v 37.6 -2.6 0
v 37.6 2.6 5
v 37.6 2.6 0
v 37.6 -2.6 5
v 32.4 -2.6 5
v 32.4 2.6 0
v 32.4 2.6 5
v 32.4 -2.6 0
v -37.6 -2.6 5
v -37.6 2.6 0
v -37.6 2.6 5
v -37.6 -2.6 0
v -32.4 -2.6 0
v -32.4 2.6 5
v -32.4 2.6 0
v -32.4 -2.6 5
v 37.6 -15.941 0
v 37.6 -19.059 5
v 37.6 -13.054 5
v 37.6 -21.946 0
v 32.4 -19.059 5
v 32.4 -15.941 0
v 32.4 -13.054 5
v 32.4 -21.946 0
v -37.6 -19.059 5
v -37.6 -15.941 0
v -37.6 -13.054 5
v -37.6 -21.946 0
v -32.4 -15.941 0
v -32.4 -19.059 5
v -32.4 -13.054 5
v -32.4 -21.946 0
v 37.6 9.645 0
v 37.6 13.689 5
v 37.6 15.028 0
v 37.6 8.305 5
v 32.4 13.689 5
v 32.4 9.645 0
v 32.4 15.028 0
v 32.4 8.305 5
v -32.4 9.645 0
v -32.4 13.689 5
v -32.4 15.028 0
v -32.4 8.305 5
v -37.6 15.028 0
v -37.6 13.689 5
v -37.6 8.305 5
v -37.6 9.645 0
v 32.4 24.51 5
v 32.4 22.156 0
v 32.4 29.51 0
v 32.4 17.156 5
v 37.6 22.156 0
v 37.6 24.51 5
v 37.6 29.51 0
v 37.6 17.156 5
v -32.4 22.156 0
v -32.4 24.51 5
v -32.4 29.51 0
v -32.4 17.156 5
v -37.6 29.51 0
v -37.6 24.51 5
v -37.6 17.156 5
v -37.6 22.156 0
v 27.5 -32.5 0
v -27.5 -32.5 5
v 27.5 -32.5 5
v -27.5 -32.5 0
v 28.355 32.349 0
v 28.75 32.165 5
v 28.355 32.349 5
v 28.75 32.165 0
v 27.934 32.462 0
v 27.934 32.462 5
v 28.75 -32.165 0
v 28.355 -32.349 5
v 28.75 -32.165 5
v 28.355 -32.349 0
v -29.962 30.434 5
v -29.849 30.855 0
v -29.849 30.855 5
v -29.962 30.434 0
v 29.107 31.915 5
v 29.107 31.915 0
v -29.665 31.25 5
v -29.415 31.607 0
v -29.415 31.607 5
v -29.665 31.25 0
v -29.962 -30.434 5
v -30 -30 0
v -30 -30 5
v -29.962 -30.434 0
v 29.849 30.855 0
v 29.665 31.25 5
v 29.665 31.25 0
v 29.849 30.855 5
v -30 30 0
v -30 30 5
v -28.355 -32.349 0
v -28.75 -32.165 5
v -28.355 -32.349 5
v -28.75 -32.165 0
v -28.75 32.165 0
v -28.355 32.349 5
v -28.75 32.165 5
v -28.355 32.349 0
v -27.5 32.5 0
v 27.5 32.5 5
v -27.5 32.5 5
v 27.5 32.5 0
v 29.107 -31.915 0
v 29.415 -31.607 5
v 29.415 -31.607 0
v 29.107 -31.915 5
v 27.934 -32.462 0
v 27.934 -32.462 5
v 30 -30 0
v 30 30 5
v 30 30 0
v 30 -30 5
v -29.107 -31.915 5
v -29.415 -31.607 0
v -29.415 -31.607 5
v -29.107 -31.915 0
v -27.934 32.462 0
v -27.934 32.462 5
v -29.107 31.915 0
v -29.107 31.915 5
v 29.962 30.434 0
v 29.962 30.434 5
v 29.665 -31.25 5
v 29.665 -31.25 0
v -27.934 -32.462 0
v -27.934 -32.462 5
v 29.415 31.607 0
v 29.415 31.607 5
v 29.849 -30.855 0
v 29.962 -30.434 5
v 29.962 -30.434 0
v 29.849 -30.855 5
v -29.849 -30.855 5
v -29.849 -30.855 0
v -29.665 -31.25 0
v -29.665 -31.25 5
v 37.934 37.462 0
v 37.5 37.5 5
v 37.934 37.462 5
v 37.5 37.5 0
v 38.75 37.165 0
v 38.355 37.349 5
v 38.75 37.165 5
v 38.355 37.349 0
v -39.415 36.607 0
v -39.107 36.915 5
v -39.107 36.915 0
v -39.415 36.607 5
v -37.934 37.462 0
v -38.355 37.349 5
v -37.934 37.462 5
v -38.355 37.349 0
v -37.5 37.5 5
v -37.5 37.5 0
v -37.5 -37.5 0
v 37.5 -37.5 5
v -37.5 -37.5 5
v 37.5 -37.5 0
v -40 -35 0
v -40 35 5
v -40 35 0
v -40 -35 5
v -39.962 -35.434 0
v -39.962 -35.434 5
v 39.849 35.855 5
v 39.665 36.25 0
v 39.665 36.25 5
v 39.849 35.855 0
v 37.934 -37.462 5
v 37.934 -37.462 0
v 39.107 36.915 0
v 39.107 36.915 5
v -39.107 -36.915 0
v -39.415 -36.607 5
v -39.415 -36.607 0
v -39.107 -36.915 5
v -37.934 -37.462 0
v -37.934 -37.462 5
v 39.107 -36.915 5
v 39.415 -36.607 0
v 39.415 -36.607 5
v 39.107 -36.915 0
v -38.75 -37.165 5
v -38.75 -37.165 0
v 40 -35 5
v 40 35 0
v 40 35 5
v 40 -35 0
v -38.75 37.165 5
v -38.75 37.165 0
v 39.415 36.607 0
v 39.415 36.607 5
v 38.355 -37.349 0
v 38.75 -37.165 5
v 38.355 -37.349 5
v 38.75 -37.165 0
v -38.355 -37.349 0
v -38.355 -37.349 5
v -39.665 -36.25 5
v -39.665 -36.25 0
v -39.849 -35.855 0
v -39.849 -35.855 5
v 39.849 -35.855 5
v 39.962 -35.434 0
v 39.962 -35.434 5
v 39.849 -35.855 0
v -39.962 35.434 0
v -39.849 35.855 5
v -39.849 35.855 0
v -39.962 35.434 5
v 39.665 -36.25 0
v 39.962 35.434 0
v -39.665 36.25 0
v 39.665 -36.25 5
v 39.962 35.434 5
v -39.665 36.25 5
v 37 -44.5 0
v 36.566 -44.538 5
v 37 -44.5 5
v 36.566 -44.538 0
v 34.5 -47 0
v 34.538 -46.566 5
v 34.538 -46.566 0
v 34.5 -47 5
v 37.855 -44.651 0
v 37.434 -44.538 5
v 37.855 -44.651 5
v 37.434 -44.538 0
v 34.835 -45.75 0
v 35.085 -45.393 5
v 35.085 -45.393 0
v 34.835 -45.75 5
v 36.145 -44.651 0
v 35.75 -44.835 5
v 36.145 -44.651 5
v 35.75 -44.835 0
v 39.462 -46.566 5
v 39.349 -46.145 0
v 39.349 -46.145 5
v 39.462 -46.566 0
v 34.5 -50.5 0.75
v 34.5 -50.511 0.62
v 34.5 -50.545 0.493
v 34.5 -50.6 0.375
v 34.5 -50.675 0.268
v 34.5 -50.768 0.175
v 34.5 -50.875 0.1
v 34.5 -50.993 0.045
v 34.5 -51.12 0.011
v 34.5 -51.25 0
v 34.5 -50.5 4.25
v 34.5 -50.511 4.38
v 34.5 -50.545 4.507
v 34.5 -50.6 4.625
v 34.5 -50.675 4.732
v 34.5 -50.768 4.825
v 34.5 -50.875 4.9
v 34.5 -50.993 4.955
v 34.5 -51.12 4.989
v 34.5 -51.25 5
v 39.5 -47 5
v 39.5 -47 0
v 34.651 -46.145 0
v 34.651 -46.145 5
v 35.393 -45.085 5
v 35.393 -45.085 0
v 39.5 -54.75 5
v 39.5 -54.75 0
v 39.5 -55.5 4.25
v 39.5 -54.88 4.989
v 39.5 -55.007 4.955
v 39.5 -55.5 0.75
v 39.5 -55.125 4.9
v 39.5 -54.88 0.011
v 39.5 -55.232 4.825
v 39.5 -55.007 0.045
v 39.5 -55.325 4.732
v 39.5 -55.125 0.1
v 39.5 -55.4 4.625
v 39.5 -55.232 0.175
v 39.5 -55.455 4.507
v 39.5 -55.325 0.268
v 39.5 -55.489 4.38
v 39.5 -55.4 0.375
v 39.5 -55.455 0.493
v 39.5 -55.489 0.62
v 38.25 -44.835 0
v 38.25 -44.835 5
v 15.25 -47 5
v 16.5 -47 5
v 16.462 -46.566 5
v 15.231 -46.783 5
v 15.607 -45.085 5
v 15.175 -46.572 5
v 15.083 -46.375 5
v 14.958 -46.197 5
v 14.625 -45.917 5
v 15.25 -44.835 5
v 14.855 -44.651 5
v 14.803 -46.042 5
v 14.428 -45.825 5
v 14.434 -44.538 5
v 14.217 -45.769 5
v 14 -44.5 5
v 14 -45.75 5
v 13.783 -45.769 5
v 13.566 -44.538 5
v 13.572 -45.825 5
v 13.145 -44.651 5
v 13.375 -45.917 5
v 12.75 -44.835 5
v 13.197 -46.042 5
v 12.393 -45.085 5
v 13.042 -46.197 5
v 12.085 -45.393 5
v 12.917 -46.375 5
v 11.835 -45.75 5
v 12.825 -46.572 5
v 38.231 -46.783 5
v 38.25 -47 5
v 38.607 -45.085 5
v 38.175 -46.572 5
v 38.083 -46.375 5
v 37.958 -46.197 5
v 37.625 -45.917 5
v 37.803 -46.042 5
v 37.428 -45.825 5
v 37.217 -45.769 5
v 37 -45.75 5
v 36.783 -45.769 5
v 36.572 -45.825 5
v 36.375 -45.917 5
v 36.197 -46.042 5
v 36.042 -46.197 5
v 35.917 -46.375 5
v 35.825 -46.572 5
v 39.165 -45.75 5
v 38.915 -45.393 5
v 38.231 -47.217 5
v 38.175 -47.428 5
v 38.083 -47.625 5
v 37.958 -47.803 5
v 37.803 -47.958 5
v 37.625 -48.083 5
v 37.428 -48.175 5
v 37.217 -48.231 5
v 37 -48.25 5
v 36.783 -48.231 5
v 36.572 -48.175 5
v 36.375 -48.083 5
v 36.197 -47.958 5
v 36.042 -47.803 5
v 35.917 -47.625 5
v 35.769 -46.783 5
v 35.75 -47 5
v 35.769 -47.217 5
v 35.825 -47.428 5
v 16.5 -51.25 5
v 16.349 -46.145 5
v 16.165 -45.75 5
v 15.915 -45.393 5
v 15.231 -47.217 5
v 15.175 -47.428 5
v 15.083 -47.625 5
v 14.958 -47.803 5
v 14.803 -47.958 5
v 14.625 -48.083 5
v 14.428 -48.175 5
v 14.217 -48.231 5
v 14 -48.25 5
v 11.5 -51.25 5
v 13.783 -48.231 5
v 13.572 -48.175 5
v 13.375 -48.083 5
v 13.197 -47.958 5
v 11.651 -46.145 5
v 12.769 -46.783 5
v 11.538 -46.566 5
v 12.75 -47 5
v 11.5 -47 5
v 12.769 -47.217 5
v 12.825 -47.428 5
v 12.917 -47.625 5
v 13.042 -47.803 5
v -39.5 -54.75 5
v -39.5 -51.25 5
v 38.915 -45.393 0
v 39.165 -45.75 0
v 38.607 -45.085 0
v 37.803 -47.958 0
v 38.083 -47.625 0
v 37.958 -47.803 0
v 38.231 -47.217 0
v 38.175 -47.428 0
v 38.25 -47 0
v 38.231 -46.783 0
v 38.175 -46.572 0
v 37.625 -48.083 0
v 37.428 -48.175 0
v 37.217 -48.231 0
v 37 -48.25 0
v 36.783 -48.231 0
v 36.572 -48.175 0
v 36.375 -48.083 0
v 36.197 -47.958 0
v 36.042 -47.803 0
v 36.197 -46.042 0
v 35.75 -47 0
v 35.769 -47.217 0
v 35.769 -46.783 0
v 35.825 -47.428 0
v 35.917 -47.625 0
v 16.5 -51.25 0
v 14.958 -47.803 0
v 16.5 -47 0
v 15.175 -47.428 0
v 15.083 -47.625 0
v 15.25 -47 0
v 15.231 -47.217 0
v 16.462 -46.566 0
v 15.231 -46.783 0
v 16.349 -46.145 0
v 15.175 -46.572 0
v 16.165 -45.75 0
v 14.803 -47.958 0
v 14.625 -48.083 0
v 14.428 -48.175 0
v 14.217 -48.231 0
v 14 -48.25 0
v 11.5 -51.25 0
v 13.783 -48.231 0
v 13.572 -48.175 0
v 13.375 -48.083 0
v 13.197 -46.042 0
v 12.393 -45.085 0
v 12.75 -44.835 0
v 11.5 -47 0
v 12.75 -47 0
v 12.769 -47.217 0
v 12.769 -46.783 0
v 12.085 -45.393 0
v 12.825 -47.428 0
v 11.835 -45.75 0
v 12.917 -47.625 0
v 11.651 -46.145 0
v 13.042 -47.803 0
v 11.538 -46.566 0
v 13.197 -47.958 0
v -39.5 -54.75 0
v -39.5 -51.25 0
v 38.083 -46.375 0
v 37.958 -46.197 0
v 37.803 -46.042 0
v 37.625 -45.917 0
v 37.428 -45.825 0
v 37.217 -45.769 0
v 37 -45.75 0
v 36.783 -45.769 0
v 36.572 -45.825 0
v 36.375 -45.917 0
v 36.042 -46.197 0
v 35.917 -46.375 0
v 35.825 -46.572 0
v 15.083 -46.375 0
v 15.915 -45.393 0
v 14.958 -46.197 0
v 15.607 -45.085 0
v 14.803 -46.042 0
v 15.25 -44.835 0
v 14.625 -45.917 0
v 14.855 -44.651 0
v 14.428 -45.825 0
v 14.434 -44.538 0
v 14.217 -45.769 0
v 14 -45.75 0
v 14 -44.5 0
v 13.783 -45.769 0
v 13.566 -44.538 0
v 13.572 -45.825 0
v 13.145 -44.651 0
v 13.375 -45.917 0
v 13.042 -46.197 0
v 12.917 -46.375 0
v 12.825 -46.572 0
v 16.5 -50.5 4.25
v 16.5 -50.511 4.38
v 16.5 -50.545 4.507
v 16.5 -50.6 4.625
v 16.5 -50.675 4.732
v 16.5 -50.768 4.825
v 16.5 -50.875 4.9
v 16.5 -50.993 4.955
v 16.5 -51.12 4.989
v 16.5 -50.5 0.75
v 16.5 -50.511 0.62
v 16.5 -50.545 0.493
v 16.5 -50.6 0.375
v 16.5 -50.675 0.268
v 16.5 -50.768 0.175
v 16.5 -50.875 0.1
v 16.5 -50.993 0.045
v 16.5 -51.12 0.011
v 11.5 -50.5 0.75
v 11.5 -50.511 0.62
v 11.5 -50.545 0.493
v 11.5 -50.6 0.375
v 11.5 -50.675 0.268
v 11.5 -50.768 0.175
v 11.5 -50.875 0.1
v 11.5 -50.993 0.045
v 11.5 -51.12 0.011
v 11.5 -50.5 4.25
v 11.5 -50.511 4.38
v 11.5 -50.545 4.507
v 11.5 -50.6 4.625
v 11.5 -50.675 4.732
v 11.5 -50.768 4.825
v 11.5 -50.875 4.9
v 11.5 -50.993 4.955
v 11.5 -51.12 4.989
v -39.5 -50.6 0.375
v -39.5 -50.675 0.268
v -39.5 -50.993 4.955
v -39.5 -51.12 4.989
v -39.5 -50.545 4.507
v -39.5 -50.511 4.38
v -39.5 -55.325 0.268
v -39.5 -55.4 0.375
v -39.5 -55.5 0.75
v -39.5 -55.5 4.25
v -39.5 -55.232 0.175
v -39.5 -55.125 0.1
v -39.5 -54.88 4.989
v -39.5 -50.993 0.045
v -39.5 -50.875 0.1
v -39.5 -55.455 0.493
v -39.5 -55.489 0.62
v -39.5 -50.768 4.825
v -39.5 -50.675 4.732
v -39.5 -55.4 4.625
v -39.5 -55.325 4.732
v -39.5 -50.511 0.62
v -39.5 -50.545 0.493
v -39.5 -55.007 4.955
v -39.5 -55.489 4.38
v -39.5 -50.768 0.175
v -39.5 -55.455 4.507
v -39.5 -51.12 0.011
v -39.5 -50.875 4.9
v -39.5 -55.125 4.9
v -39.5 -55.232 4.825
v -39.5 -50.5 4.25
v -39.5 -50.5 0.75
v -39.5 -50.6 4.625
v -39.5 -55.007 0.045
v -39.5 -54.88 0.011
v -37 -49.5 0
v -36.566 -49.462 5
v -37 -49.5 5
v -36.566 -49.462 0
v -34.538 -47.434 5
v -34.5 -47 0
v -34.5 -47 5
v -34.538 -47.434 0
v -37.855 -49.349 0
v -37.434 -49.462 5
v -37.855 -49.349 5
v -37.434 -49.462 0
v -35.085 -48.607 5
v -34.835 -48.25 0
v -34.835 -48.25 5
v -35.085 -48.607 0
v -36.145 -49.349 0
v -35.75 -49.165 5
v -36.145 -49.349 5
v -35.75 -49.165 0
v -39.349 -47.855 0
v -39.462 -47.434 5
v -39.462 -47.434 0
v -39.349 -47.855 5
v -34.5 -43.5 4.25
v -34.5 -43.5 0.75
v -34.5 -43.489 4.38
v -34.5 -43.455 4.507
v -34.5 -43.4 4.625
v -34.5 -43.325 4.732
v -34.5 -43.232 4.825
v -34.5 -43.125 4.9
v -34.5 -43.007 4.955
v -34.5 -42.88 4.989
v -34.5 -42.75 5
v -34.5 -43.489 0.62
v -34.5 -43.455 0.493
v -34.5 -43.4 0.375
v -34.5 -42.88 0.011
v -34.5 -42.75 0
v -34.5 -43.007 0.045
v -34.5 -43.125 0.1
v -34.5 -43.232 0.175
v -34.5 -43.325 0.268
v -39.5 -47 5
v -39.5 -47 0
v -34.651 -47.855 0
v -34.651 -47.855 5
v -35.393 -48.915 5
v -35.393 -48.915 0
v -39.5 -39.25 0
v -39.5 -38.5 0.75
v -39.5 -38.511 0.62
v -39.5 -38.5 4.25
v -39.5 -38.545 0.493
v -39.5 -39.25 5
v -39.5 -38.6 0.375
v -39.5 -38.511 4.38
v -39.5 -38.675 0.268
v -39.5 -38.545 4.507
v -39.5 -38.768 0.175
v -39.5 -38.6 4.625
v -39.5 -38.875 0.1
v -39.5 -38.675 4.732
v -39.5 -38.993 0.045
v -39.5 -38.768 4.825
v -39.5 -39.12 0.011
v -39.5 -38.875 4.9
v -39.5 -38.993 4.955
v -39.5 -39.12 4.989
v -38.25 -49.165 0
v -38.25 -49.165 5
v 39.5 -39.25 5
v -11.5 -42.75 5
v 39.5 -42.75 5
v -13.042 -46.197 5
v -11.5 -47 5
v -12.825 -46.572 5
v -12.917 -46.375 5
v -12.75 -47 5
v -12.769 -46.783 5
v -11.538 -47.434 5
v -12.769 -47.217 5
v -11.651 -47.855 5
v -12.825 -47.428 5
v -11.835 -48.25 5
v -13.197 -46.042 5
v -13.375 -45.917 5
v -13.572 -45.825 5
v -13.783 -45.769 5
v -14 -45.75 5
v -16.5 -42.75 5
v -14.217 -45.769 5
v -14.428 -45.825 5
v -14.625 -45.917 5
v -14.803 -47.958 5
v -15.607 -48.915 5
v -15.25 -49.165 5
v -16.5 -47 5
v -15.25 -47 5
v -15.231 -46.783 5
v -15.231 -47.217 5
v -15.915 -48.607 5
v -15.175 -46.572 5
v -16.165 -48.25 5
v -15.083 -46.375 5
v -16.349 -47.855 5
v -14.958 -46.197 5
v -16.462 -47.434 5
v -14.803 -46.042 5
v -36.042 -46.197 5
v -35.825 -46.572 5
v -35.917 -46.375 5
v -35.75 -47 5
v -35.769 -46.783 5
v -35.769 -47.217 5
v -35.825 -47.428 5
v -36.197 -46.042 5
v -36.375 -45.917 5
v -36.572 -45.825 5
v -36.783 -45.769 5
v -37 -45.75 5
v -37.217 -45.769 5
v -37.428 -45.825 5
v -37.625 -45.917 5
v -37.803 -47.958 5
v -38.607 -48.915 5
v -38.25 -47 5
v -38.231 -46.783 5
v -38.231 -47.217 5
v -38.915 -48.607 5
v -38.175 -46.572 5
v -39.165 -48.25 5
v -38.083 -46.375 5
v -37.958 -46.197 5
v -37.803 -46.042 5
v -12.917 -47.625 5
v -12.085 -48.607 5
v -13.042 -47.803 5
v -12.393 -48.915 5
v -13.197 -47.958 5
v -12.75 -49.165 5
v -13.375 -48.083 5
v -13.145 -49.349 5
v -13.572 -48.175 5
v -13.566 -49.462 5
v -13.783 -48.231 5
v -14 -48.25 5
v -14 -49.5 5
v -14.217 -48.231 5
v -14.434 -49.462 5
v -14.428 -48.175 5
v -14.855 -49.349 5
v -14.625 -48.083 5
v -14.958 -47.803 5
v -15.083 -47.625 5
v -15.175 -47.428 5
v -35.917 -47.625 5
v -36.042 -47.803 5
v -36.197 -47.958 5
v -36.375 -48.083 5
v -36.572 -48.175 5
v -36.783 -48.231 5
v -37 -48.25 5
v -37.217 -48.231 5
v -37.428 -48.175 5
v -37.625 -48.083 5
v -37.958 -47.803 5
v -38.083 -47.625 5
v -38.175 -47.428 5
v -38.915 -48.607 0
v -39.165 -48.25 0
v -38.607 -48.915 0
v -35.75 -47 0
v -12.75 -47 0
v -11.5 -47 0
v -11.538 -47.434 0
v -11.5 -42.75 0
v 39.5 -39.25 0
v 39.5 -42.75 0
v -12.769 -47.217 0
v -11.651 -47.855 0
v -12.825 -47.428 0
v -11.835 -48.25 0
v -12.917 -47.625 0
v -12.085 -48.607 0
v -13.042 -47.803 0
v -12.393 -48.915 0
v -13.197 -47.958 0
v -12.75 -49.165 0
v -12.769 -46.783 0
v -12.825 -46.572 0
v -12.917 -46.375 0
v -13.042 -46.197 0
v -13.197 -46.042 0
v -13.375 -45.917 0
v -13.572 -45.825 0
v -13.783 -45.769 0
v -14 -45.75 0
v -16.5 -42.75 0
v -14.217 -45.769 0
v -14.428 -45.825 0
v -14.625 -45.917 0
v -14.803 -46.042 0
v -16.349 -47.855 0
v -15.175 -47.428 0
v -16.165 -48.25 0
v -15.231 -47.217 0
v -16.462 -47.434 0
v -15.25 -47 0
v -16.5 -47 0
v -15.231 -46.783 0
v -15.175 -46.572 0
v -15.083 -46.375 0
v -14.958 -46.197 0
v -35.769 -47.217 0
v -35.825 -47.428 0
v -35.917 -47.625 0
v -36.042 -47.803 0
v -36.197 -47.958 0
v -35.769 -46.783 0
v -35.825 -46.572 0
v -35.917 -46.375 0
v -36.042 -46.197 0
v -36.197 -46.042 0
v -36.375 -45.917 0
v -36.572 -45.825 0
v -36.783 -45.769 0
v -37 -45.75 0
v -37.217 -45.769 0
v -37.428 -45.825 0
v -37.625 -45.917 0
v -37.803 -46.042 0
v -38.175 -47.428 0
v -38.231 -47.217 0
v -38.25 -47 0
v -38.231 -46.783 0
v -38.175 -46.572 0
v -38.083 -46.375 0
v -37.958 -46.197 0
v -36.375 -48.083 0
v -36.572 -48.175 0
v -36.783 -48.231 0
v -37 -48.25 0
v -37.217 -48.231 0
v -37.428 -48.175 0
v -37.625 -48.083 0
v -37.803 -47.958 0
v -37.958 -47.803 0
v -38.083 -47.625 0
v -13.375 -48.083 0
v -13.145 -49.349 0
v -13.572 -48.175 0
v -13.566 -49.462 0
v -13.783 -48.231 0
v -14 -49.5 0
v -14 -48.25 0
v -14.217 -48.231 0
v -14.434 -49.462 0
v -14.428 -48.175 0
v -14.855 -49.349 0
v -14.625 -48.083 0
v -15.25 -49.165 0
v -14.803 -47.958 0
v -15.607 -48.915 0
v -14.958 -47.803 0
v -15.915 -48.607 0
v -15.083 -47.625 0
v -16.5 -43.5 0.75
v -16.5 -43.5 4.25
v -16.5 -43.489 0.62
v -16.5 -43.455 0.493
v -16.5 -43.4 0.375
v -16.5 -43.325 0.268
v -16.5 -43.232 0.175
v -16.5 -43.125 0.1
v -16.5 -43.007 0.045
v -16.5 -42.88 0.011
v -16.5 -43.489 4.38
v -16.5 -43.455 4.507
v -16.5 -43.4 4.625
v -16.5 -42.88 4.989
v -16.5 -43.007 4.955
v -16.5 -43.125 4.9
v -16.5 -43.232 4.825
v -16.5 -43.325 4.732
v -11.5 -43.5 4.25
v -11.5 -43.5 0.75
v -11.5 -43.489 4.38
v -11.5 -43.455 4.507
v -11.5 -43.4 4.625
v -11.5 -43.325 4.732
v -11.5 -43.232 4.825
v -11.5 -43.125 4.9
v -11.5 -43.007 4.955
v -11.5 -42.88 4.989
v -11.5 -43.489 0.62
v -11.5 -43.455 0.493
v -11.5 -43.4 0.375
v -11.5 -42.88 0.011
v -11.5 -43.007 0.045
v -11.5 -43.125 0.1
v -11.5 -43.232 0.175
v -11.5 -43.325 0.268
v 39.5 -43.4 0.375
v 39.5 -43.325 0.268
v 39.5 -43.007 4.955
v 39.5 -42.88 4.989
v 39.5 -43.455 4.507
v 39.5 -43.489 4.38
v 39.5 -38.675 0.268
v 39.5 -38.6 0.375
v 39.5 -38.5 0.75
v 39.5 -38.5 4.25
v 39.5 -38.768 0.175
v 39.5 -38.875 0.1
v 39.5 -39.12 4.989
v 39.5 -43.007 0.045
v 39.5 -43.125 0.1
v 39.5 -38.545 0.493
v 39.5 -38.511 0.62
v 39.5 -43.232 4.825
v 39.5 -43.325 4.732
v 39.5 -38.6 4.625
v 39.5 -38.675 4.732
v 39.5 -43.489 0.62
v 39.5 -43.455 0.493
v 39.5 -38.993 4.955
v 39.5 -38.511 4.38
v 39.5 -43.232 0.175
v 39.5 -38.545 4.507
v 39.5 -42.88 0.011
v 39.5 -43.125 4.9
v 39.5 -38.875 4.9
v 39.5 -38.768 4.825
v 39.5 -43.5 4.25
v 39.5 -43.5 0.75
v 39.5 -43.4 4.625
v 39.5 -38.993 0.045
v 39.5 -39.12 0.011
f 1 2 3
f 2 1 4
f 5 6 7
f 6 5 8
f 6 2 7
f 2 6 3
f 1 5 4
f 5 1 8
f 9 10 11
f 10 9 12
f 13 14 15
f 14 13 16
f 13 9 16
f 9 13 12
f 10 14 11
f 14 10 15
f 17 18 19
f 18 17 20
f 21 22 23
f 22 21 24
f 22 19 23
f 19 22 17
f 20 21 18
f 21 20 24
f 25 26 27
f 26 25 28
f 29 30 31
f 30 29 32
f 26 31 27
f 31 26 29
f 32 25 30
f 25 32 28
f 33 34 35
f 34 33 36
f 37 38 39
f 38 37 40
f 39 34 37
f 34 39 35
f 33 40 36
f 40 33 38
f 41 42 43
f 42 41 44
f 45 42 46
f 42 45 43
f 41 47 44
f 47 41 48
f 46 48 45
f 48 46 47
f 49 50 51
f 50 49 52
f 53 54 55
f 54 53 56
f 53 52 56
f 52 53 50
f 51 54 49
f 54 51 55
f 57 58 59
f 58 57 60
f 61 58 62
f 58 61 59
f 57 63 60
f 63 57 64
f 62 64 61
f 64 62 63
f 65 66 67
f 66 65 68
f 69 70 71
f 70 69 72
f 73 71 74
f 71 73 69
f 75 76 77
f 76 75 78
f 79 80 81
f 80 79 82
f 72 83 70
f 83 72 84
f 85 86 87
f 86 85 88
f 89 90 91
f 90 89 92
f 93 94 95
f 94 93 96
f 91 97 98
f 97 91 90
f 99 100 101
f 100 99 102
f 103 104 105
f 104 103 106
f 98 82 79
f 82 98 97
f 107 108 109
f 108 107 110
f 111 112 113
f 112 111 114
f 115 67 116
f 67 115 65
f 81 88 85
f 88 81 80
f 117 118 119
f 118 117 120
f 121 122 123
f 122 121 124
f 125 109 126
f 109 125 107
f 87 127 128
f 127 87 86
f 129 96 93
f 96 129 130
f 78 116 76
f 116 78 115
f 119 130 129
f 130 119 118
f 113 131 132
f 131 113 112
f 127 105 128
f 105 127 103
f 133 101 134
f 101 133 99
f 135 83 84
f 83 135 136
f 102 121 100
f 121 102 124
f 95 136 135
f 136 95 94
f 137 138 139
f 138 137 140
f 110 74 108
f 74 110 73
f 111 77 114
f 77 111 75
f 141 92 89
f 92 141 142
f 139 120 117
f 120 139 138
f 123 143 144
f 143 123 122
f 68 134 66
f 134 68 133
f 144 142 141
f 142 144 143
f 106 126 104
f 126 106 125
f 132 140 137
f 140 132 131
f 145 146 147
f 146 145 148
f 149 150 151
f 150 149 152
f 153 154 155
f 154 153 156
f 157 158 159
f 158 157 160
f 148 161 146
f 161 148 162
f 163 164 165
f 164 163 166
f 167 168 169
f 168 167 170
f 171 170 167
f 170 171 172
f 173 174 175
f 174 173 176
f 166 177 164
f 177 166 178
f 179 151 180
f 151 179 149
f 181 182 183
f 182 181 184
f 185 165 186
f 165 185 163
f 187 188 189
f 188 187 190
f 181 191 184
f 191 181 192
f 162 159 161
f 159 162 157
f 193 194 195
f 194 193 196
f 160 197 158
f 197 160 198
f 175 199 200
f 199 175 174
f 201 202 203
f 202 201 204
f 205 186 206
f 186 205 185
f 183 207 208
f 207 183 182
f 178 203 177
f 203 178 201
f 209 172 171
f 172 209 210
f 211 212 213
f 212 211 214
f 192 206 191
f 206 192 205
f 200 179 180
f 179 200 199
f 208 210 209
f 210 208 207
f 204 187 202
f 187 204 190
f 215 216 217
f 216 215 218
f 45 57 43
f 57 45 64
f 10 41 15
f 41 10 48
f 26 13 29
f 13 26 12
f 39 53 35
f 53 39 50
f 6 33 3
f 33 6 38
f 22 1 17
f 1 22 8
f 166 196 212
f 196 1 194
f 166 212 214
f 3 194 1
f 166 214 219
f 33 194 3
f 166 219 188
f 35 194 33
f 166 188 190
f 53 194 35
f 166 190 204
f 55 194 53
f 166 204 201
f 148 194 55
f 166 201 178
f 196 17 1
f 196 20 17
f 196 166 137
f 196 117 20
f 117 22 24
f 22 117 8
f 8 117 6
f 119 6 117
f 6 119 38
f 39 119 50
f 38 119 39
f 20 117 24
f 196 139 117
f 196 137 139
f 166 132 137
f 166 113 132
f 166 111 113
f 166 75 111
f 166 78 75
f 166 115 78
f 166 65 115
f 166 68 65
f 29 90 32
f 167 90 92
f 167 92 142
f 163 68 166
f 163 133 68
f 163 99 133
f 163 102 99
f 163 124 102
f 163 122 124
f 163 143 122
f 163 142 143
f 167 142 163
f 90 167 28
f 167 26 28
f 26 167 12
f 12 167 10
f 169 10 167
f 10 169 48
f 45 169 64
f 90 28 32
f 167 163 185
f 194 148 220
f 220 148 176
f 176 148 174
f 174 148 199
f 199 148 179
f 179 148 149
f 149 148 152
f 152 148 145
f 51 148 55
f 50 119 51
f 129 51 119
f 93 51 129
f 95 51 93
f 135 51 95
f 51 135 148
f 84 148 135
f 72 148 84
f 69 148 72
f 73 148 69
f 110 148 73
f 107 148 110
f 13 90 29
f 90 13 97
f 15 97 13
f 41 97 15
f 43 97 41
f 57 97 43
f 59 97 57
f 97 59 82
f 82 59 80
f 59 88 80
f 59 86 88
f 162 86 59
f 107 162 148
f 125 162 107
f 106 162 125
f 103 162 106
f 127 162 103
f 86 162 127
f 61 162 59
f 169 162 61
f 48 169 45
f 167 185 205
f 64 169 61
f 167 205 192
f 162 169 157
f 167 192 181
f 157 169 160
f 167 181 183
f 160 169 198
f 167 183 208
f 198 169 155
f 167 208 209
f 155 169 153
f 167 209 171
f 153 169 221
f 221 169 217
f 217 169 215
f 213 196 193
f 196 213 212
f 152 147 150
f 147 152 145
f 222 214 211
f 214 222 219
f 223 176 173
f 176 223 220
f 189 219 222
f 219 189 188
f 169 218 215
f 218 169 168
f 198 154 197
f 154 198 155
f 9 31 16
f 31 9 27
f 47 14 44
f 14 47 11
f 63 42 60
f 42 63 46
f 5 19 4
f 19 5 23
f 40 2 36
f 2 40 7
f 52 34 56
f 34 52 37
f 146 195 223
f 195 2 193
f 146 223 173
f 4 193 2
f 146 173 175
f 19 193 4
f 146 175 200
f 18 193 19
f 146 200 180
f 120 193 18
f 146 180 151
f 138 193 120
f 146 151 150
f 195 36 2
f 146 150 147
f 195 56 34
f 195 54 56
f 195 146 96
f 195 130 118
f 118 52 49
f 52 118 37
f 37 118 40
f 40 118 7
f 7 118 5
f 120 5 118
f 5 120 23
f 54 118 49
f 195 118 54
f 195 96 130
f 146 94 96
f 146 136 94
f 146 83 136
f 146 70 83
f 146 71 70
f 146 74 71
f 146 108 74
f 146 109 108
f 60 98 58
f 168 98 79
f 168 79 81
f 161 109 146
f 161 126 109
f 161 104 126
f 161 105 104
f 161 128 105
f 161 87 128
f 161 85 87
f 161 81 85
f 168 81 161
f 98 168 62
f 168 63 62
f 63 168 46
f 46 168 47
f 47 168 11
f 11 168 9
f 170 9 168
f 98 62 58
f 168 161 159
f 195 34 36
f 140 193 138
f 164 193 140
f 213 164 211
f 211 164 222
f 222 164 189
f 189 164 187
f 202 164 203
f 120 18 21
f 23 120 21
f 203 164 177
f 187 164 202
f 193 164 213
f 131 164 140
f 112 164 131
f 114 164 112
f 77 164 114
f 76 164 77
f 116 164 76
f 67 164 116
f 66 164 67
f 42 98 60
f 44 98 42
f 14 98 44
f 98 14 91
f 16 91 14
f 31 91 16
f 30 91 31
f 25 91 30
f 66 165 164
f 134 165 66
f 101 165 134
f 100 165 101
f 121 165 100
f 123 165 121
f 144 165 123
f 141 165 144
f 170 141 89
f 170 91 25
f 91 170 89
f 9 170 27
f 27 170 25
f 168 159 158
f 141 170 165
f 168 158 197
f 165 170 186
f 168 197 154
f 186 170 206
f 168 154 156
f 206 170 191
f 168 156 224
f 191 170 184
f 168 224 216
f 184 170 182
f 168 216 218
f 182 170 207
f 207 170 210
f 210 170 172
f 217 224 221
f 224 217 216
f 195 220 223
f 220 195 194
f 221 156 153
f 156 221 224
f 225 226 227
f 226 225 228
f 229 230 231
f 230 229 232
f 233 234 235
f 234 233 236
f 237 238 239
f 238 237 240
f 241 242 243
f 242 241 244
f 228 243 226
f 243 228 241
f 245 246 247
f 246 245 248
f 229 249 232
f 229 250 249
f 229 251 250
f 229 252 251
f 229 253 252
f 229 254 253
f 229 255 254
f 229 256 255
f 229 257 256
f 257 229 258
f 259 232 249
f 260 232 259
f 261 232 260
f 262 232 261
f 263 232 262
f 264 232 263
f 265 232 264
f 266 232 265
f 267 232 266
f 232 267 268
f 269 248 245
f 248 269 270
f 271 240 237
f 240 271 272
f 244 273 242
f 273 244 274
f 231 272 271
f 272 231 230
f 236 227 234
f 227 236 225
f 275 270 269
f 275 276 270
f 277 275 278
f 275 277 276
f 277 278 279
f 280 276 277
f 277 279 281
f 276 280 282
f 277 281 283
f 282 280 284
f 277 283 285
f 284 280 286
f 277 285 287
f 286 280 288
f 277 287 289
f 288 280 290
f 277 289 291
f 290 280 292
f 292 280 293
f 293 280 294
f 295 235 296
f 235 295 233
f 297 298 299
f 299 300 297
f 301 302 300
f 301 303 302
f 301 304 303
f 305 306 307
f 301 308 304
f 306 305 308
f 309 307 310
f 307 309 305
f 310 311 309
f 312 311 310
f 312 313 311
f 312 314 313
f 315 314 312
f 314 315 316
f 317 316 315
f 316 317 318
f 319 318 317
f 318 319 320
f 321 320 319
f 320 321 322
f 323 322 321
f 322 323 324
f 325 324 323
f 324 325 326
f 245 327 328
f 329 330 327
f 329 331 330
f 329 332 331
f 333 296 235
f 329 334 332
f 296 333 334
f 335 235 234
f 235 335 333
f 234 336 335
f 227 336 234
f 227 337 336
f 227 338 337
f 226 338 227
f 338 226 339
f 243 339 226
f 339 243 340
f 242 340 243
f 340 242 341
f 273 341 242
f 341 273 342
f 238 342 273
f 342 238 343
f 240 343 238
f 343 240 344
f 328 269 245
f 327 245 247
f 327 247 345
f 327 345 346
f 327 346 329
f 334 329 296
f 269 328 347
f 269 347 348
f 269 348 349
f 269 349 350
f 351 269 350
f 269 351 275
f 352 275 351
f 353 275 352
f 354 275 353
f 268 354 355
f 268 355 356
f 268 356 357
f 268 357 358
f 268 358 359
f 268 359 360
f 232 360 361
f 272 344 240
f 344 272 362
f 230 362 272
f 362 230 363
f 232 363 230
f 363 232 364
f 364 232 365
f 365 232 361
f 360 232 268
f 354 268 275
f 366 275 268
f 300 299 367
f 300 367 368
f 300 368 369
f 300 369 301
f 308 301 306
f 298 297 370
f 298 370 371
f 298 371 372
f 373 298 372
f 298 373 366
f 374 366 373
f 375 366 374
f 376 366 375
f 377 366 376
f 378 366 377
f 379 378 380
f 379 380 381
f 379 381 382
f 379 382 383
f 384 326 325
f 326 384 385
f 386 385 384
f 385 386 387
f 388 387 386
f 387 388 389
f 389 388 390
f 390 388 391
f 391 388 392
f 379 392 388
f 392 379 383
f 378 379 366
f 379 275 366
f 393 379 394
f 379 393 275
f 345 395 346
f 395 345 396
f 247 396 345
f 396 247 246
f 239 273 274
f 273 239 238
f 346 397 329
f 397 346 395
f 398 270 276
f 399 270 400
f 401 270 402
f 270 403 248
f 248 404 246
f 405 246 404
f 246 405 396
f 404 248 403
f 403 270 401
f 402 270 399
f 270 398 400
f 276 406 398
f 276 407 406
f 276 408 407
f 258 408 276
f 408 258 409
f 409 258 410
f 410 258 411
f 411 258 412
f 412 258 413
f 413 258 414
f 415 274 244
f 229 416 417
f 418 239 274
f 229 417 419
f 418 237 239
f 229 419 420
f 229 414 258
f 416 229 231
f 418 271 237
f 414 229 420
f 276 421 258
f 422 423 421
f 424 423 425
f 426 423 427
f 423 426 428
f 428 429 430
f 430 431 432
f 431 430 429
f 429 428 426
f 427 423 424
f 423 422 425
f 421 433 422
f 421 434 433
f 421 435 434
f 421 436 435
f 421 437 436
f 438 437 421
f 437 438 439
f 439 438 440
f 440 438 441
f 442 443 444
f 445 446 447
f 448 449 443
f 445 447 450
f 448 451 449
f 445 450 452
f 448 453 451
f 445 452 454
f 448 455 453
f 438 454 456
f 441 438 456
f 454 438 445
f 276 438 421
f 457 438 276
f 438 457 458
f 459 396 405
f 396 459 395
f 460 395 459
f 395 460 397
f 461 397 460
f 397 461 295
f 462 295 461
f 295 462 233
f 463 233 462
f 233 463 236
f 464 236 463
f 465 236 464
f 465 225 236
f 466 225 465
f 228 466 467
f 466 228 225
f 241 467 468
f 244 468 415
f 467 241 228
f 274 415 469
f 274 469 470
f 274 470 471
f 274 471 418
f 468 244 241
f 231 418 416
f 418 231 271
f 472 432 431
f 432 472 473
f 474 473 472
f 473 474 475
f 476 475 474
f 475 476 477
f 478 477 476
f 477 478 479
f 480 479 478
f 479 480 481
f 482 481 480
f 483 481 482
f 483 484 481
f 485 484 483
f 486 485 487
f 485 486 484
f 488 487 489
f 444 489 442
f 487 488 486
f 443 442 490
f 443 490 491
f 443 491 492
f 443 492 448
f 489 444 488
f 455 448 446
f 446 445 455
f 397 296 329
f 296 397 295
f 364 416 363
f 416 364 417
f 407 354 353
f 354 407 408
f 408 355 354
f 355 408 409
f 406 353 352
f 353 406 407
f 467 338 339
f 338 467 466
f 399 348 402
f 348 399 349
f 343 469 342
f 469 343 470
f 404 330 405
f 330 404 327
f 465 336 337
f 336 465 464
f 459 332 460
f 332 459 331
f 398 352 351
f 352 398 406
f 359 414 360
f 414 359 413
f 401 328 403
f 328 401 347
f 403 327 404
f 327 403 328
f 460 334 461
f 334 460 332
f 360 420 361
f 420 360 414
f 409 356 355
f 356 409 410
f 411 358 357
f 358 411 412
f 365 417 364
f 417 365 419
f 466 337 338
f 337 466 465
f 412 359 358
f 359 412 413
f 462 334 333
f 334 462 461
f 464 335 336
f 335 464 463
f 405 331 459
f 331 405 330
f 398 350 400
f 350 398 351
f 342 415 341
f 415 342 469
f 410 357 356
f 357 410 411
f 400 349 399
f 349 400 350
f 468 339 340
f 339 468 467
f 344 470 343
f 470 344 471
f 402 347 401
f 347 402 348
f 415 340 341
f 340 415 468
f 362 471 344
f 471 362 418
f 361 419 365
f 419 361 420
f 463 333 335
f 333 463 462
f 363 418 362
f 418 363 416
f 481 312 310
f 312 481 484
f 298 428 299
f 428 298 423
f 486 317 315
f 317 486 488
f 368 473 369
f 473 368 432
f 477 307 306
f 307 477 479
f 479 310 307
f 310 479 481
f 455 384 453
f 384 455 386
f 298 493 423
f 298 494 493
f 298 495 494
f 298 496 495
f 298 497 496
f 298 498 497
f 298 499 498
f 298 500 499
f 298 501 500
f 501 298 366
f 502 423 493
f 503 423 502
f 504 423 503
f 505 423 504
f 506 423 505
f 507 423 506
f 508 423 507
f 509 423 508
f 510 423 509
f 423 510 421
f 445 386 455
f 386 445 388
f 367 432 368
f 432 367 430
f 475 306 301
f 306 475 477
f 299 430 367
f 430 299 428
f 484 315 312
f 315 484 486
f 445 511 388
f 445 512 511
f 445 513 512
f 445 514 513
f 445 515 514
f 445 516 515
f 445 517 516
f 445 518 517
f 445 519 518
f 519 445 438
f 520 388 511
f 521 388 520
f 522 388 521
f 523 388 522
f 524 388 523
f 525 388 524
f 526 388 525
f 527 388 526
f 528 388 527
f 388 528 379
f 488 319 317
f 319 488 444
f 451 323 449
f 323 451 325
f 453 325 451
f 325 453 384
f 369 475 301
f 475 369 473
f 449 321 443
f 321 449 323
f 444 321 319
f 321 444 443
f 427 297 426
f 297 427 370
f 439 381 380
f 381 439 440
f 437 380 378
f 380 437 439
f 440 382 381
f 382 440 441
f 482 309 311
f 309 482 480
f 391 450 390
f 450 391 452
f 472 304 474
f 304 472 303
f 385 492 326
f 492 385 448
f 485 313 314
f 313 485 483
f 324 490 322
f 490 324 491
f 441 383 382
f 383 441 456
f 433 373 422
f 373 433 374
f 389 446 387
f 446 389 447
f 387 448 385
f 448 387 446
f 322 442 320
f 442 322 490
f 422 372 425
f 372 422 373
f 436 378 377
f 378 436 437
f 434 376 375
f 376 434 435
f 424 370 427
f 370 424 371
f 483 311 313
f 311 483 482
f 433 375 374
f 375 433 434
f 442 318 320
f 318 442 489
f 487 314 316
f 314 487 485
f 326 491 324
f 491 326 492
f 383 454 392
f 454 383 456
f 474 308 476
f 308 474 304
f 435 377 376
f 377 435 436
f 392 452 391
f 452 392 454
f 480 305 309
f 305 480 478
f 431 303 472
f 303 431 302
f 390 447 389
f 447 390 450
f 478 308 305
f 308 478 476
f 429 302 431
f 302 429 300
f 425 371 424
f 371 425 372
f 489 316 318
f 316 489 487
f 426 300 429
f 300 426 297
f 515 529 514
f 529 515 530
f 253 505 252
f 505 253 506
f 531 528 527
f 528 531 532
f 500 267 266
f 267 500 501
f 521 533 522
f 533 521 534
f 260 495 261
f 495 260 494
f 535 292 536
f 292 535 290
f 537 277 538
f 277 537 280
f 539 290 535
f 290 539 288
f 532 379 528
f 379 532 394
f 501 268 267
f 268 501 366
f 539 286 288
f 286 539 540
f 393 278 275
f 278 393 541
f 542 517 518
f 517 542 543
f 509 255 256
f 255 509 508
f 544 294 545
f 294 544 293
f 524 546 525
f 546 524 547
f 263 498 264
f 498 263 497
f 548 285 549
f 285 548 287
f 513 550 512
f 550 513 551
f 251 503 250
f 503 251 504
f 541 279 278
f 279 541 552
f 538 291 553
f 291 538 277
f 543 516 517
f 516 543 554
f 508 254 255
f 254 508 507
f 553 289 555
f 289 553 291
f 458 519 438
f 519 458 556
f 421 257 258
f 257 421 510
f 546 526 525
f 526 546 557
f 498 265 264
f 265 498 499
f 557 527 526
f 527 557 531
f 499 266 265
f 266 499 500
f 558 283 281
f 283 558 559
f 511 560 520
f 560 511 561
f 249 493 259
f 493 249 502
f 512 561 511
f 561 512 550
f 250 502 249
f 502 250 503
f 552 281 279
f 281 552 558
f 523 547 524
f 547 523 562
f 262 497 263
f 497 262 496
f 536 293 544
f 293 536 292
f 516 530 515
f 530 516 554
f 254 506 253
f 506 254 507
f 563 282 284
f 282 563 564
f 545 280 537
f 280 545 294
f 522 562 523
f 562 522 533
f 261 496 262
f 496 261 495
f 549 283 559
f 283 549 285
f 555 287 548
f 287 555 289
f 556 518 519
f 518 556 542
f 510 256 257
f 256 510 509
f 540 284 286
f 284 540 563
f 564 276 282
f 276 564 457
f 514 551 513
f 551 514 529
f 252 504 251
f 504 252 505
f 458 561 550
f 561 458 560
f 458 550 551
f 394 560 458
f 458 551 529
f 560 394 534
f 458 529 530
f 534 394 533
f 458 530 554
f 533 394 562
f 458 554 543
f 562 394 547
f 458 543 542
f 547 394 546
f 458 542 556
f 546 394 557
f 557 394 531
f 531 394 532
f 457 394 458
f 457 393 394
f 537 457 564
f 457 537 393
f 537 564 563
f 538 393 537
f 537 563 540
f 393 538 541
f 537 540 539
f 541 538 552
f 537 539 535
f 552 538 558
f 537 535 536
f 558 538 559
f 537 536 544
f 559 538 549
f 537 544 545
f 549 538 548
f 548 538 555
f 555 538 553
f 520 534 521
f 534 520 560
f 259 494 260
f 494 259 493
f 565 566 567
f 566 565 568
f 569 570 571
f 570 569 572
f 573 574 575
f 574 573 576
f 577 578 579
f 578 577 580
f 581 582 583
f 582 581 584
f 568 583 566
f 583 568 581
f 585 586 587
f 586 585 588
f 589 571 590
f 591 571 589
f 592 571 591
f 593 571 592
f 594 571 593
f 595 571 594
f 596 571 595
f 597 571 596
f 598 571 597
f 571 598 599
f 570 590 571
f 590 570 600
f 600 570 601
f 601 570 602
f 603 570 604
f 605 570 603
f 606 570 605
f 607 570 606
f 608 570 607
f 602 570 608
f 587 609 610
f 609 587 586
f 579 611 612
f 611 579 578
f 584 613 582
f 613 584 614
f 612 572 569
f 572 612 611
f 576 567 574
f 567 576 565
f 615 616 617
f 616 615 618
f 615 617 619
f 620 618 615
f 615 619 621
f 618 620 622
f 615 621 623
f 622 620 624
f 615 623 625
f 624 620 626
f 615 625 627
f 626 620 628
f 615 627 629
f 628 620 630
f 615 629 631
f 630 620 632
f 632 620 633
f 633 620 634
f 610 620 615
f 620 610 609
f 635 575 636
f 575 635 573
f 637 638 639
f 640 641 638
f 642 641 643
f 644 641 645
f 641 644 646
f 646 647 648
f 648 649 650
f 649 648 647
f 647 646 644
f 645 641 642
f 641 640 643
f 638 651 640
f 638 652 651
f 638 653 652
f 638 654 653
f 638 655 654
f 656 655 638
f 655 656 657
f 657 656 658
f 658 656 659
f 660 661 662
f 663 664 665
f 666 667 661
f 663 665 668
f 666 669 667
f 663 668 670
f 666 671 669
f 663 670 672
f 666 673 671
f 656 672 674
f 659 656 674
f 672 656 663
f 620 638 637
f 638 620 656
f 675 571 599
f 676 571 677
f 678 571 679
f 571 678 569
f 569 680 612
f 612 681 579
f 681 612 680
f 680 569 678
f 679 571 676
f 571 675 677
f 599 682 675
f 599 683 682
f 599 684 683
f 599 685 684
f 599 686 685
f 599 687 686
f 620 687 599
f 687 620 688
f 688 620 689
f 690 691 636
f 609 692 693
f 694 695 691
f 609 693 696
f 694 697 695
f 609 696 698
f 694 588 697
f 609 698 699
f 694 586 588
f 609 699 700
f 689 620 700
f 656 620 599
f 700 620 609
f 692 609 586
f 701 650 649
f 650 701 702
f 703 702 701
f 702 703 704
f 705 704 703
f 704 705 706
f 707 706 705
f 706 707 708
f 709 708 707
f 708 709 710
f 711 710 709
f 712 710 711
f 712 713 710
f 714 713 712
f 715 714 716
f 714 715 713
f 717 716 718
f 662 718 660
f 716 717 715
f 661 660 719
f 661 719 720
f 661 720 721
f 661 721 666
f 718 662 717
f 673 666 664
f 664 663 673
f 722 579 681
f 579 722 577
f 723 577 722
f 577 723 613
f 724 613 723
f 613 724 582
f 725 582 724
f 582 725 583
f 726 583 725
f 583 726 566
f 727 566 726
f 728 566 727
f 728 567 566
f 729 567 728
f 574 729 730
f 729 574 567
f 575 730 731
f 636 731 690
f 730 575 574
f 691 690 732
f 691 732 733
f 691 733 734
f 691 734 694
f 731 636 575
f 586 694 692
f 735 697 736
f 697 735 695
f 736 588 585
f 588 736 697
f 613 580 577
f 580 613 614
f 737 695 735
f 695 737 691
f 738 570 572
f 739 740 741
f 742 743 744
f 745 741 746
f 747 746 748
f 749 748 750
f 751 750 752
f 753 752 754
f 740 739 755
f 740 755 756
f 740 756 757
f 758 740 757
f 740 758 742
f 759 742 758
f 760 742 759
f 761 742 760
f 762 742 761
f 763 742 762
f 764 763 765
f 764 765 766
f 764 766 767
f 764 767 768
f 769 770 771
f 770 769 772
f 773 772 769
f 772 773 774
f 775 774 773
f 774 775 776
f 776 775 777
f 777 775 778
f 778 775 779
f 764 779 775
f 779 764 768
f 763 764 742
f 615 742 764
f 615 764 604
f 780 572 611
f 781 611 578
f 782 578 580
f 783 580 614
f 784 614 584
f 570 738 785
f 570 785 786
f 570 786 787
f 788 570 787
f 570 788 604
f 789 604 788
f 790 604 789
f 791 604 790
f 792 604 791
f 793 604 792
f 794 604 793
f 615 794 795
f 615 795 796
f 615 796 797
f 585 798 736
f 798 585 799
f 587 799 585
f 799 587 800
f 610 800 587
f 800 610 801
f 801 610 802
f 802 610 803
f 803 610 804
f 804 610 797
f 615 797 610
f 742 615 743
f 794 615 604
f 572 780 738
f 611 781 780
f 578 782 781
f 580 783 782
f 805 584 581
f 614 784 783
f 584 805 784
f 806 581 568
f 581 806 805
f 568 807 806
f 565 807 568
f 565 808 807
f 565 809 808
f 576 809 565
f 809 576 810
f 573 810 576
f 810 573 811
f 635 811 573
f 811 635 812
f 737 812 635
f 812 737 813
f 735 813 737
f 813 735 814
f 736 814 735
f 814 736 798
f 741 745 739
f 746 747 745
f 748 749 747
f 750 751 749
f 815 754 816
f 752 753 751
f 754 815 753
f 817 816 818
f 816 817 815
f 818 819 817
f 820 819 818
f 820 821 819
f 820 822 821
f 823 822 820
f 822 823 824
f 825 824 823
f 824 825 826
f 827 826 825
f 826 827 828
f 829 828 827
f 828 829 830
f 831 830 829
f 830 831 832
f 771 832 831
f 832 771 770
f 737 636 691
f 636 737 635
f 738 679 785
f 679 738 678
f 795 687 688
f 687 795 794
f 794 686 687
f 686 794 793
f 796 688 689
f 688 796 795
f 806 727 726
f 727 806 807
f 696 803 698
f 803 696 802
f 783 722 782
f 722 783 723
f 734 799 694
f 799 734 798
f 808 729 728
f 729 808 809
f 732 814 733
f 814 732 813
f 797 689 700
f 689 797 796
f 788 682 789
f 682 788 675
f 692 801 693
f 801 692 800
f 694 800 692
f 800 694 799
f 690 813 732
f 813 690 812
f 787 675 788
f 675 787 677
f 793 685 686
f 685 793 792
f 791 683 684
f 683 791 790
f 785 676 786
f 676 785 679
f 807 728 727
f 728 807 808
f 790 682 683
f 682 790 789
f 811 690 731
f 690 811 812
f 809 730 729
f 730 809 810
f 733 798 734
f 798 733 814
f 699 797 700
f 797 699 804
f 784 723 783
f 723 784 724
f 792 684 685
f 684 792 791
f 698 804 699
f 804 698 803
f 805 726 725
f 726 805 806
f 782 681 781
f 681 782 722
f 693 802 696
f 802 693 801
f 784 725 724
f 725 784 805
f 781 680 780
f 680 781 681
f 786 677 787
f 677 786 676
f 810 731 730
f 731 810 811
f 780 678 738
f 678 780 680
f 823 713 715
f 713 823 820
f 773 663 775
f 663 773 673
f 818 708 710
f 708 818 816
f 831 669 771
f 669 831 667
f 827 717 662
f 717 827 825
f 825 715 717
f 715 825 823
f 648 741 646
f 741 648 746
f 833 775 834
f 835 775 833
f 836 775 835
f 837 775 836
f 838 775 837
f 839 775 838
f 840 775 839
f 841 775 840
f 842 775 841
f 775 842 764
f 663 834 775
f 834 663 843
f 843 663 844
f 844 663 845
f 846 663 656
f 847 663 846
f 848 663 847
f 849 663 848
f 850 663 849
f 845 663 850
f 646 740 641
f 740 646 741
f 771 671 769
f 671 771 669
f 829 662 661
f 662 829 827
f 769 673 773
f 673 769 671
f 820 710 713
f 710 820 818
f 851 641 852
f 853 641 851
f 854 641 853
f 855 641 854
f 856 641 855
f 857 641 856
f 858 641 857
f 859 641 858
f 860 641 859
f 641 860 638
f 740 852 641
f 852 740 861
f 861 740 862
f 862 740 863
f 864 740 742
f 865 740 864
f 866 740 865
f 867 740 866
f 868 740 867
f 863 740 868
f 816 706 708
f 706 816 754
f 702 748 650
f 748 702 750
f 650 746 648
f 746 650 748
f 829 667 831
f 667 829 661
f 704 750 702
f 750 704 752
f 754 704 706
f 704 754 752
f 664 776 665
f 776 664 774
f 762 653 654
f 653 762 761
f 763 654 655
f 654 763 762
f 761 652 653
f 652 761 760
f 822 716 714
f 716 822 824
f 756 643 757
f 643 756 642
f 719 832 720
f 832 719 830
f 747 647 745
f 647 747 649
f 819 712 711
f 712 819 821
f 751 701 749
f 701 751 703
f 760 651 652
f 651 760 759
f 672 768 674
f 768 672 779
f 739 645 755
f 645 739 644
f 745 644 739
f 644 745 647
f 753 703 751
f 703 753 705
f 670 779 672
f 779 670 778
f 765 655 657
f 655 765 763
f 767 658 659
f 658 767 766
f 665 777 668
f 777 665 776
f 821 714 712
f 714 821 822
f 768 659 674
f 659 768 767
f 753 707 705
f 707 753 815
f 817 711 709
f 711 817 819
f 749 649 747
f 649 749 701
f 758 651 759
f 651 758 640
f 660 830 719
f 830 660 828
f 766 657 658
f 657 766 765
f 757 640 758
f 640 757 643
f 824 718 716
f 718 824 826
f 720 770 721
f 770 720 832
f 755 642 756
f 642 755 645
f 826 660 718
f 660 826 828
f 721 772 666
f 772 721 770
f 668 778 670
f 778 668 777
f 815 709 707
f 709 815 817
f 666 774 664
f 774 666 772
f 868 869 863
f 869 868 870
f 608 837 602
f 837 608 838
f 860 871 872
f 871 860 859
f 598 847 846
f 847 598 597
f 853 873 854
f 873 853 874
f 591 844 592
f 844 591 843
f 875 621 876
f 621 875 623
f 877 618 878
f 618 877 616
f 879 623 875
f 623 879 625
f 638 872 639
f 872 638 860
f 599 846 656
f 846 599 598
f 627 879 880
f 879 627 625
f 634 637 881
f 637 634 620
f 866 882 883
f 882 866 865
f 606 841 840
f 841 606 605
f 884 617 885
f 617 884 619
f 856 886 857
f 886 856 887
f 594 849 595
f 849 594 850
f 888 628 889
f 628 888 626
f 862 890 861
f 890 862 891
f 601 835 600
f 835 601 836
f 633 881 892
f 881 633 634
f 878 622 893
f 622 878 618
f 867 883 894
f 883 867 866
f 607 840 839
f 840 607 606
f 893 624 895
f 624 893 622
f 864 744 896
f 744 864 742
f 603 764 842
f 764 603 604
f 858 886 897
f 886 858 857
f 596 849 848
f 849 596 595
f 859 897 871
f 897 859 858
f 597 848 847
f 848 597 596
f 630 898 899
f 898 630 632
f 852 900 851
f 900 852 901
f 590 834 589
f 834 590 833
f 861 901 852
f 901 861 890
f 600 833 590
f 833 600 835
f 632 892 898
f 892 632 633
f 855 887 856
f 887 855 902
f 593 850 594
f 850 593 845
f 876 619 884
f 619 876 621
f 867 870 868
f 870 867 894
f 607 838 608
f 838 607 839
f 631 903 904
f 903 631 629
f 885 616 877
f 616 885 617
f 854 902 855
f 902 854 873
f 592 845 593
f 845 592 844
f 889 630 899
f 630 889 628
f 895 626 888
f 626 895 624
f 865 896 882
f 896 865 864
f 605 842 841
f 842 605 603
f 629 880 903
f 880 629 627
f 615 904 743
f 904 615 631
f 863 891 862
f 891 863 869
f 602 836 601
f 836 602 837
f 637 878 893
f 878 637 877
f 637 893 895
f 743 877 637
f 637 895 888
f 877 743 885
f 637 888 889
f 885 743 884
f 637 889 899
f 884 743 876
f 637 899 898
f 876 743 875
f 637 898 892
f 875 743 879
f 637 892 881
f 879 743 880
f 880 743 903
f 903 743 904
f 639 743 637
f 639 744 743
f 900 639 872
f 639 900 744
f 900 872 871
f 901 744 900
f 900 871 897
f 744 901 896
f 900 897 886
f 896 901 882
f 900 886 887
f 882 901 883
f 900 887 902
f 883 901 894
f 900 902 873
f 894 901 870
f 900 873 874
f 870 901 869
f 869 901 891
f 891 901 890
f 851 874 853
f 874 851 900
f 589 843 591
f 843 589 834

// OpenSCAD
// Vertical stand/mount for Raspberry Pi Zero, Zero 2, BanannaPi M2 Zero, Radxa Zero
// b.kenyon.w@gmail.com

// main configurables
pi_elevation = 45; // top of base to bottom edge of pcb
foot_length = 35;

// configurables
screw_post_id = 2.5; // fdm naturally shrinks holes a little, M2.5 should not need a nut
screw_post_od = 5; // 6 or less for Bannanna or Radxa, may be greater for Raspberry
beam_width = screw_post_od; // 2
beam_thickness = beam_width; // 6
post_offset_extra = 0; // gap between pcb and post
angle_a = 15; //30; // more post holes at other angles besides the 90 degree set
angle_b = 30; //45;
angle_c = 45; //60;
fc = 0.1; // fitment clearance - if the posts don't fit in the holes, increase this
pcr = 0.75; // post corner radius - round the corners of the post cross-section so they fit in the post holes

// not configurable - pi zero dimensions
// pcb
pcb_x = 65;
pcb_y = 30;
pcb_cr = 3;
pcb_thickness = 1.6;
// screw holes
screws_x = 58;
screws_y = 23;

post_offset_min = pcb_x/2-screws_x/2+beam_width/2; // edge of post at edge of pcb, Bananna & Radxa have parts on back
post_offset = post_offset_min + post_offset_extra; // post X offset from screw holes

$fn = 36;
o = 0.01;
s=1; // print_kit() part seperation

print_kit();  // print all parts
//base(); // print just the base
//post(); // print just one post

//assembly(); // display all parts assembled
//assembly(angle_a);
translate([0,0,beam_thickness*4]) %assembly(angle_b);
//assembly(angle_c);

module print_kit () {

 base();

 // automatically put posts in the middle if they fit, else in front
 il = screws_x+post_offset*2-beam_width*2; // inside length
 pl = beam_thickness+pi_elevation+pcb_y/2+screws_y/2+screw_post_od/2; // post length
 pw = beam_width/2 + post_offset + screw_post_od/2 + s + beam_width; // posts pair width
 px = (s+pl+s>il) ? pl/2 : pl-il/2+s; // post x offset
 py = (s+pl+s>il) ? foot_length + beam_width/2 + s + pw/2 : 0; // posts pair y offset

 translate([0,-py,0]) {
  translate([-px,post_offset/2-beam_width/4-screw_post_od/4-s/2,0])
   rotate([0,0,-90])
    post();
  translate([px,-post_offset/2+beam_width/4+screw_post_od/4+s/2,0])
    rotate([0,0,90])
    post();
 }

}

module assembly (a=0) {

 if (a==angle_a)
  translate([0,foot_length/3,beam_thickness/2])
   rotate([-a,0,180])
    translate([0,0,-beam_thickness/3])
     tower();

 else if(a==angle_b)
  translate([0,-foot_length/2,beam_thickness/2])
   rotate([-a,0,0])
    translate([0,0,-beam_thickness/4])
     tower();

 else if(a==angle_c)
  translate([0,foot_length-foot_length/3,beam_thickness/2])
   rotate([-a,0,180])
    translate([0,0,-beam_thickness/5])
     tower();

 else tower();

 base();
}

module base () {
 translate([0,0,beam_thickness/2])
  difference(){
   
   // outside
   hull()
    mirror_copy([0,1,0])
     translate([0,foot_length,0])
      mirror_copy([1,0,0])
       translate([screws_x/2+post_offset+beam_width/2,0,0])
        cylinder(h=beam_thickness,d=beam_width,center=true);

   group(){
    // inside
    hull()
     mirror_copy([0,1,0])
      translate([0,foot_length-beam_width,0])
       mirror_copy([1,0,0])
        translate([screws_x/2+post_offset-beam_width-beam_width/2,0,0])
         cylinder(h=o+beam_thickness+o,d=beam_width,center=true);

     // vertical post holes
     mirror_copy([1,0,0])
      translate([screws_x/2+post_offset,0,0])
       cube([fc+beam_width+fc,fc+beam_thickness+fc,o+beam_thickness+o],center=true);

     // angle_b post holes
      mirror_copy([1,0,0])
       translate([screws_x/2+post_offset,-foot_length/2,0])
        rotate([-angle_b,0,0])
         cube([fc+beam_width+fc,fc+beam_thickness+fc,beam_thickness*3],center=true);
      // angle_a post holes
      mirror_copy([1,0,0])
       translate([screws_x/2+post_offset,foot_length/3,0])
        rotate([angle_a,0,0])
         cube([fc+beam_width+fc,fc+beam_thickness+fc,beam_thickness*3],center=true);
      // angle_c post holes
      mirror_copy([1,0,0])
       translate([screws_x/2+post_offset,foot_length-foot_length/3,0])
        rotate([angle_c,0,0])
         cube([fc+beam_width+fc,fc+beam_thickness+fc,beam_thickness*3],center=true);
   } // group

  } // difference
}

module tower () {
  translate([0,-beam_thickness/2,beam_thickness+pi_elevation+pcb_y/2])
   rotate([90,0,0])
    %pcb();

  translate([0,beam_thickness/2,0])
   rotate([90,0,0])
    mirror_copy([1,0,0])
     translate([screws_x/2,0,0])
      post();
}

module post () {
 translate([0,pcb_y/2+beam_thickness+pi_elevation,0]) {

  // arms
  mirror_copy([0,1,0])
   translate([0,screws_y/2,0])
    arm();

  // trunk - rounded corners for tighter fit in post hole
  translate([post_offset,screws_y/2+screw_post_od/2,beam_thickness/2])
   rotate([90,0,0])
    hull()
     mirror_copy([0,1,0])
      translate([0,beam_thickness/2-pcr,0])
       mirror_copy([1,0,0])
        translate([beam_width/2-pcr,0,0])
         cylinder(h=beam_thickness+pi_elevation+pcb_y/2+screws_y/2+screw_post_od/2,r=pcr);

 }
}

module arm () {
 difference() {

  hull () {
   cylinder(h=beam_thickness,d=screw_post_od);
   translate([post_offset-1,-screw_post_od/2,0])
    cube([1,screw_post_od,beam_thickness]);
  }

  translate([0,0,-o])
   cylinder(h=o+beam_thickness+o,d=screw_post_id);

 }
}

module pcb() {
 difference() {
  hull() {
   mirror_copy([0,1,0])
    translate([0,pcb_y/2-pcb_cr,0])
     mirror_copy([1,0,0])
      translate([pcb_x/2-pcb_cr,0,0])
       cylinder(h=pcb_thickness,r=pcb_cr);
  }
 mirror_copy([0,1,0])
  translate([0,screws_y/2,0])
   mirror_copy([1,0,0])
    translate([screws_x/2,0,-o])
     cylinder(h=o+pcb_thickness+o,d=screw_post_id);
 }

}

module mirror_copy(v) {
 children();
 mirror(v) children();
}
